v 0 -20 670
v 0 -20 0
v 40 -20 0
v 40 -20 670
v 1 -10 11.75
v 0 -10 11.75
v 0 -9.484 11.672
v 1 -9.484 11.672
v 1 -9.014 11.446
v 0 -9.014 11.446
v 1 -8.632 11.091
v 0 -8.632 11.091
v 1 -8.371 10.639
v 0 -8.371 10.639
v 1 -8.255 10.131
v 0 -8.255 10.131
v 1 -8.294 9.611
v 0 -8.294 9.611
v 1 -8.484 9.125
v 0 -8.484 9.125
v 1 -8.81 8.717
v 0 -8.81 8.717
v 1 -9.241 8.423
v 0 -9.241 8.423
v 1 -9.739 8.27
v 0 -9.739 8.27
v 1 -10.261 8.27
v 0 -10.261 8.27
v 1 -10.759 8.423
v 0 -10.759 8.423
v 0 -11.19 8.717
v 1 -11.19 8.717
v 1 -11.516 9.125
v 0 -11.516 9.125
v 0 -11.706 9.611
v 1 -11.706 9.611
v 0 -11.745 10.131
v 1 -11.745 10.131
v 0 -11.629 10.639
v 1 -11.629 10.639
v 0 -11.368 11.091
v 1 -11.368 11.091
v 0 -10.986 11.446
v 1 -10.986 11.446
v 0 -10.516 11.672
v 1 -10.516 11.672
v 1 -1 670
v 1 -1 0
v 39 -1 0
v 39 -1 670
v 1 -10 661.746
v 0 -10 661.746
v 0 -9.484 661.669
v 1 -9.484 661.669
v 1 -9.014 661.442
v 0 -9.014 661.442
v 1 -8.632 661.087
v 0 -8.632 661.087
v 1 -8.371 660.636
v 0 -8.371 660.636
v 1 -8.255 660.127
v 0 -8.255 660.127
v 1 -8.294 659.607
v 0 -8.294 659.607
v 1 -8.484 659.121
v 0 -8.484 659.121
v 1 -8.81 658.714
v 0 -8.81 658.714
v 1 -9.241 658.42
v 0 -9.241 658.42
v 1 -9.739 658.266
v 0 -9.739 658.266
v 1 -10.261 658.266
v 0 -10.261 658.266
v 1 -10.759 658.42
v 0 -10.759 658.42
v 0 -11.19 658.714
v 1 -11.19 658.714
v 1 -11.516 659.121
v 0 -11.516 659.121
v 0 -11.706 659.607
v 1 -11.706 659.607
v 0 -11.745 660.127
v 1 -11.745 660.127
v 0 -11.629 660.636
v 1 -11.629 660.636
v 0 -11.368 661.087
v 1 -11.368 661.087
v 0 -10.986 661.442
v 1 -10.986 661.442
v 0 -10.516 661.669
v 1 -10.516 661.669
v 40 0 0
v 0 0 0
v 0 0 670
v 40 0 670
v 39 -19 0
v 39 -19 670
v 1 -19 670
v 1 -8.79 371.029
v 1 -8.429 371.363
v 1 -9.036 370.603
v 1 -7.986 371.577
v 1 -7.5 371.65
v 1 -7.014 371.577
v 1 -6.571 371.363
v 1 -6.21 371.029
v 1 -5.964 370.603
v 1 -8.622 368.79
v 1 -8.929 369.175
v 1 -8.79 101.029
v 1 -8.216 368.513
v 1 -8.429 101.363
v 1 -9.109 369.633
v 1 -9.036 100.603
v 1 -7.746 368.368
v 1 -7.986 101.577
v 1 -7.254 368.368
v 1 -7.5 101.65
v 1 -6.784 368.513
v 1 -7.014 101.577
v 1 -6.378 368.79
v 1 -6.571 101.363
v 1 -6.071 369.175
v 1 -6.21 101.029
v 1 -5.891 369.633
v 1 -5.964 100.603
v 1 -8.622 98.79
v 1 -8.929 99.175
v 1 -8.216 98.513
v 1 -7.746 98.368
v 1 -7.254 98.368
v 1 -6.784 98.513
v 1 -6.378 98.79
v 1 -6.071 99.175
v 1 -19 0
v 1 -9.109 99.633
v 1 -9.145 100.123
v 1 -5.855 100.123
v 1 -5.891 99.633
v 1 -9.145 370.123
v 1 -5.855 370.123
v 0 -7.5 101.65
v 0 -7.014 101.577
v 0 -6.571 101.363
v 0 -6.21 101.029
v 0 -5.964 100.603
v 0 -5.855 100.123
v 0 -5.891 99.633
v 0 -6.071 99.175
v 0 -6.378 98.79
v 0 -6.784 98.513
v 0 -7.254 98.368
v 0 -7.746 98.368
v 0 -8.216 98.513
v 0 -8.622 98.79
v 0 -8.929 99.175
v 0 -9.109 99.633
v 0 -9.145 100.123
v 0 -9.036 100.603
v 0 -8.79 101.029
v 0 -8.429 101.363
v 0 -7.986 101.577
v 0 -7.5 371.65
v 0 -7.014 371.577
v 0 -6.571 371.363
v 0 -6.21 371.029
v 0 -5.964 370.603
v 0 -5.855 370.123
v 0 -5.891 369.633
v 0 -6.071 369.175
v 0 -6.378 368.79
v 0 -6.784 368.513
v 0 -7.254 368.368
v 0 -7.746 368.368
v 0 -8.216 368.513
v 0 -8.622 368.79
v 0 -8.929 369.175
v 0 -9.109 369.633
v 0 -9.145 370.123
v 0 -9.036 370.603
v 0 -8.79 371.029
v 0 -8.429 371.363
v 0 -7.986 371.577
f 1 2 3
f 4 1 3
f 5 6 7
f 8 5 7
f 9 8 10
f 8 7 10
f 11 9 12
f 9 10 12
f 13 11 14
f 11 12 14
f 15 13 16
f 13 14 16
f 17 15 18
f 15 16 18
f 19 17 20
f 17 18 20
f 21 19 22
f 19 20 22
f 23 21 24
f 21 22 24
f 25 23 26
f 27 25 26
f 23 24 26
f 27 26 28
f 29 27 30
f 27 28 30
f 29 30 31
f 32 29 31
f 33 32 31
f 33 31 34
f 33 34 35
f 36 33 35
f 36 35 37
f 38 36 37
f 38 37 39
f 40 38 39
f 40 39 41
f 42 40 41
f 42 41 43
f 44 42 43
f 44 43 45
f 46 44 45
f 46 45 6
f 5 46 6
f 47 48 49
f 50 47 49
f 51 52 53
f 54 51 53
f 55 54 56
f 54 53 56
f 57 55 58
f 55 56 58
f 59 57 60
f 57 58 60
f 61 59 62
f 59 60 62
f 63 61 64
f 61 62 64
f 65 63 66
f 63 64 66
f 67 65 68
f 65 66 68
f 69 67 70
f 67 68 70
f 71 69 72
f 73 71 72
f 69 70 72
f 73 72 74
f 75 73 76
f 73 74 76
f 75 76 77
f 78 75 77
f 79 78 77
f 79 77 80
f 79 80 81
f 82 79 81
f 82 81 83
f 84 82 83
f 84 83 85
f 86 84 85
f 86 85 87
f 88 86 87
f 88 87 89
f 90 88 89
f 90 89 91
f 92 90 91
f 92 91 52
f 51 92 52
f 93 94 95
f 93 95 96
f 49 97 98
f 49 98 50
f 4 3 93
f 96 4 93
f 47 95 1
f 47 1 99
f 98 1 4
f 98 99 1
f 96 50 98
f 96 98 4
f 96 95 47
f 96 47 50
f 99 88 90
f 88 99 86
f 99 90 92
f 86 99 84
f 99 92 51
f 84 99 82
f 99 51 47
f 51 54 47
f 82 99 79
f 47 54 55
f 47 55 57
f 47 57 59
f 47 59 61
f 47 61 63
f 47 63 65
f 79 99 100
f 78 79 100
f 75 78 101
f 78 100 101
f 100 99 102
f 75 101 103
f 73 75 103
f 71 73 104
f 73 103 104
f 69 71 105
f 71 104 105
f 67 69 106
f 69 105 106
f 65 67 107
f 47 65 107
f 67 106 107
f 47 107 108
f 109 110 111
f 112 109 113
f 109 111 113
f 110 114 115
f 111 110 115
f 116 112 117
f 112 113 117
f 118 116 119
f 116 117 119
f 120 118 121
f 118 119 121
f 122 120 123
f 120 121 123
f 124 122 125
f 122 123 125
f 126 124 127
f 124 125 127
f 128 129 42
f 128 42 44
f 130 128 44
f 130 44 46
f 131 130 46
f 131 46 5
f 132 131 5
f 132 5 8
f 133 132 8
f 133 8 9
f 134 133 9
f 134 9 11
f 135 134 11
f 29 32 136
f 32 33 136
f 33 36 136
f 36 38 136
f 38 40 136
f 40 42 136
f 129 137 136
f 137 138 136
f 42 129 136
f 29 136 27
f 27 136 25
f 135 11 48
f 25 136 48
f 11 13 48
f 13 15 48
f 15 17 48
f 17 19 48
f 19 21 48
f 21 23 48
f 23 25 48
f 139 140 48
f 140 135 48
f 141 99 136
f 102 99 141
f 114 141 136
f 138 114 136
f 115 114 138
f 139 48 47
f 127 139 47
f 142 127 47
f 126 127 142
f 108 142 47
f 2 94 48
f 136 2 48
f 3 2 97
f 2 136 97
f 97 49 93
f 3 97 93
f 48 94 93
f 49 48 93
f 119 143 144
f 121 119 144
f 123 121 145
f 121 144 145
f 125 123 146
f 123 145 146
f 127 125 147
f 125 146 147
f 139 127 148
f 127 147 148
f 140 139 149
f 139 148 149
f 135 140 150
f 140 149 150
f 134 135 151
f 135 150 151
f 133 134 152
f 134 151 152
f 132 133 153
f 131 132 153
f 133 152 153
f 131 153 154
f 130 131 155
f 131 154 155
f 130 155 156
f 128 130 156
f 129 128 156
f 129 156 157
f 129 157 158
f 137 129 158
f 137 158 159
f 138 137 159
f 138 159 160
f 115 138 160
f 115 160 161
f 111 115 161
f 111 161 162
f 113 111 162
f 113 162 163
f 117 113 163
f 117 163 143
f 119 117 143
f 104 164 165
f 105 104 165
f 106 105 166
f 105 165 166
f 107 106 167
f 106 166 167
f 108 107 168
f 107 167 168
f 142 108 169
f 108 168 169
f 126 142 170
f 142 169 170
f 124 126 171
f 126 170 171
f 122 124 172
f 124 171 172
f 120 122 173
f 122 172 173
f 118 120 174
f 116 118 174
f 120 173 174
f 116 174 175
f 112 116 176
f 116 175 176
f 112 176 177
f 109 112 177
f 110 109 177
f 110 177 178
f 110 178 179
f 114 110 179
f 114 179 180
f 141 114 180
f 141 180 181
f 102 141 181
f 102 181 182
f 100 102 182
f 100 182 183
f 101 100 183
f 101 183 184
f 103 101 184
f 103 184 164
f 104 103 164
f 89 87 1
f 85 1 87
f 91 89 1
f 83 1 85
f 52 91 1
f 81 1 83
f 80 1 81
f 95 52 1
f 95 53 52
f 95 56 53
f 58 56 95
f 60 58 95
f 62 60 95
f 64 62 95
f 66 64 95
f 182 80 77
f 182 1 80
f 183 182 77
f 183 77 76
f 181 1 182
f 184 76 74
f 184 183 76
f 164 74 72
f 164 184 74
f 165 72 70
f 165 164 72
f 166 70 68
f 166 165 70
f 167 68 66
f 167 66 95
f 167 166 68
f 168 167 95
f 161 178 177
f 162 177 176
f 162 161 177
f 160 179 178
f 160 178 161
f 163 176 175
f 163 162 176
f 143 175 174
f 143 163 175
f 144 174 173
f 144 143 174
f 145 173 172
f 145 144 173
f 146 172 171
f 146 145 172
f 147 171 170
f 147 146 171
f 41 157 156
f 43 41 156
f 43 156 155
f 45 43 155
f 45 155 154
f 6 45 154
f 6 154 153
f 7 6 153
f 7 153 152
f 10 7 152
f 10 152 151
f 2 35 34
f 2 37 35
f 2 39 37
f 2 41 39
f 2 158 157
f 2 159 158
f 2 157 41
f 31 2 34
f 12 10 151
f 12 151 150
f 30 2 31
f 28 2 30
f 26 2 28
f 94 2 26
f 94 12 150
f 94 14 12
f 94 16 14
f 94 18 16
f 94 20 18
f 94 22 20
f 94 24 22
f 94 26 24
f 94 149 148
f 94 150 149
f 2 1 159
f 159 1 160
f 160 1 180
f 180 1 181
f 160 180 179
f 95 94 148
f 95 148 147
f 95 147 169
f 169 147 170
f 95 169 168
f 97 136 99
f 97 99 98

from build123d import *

# Parameters (mm, degrees)
SKETCH_1_W          = 40
SKETCH_1_H          = 20
SKETCH_1_W_2        = 38
SKETCH_1_H_2        = 18
EXTRUDE_1_DEPTH     = 670
SKETCH_4_R          = 1.75
CUT_EXTRUDE_2_DEPTH = 1.5
SKETCH_8_R          = 1.65
CUT_EXTRUDE_3_DEPTH = 5


with BuildPart() as part:
    # 草图1 → 拉伸-薄壁1 (new body)
    with BuildSketch(Plane.XY):
        with Locations((20, -10)):
            Rectangle(SKETCH_1_W, SKETCH_1_H)
        with Locations((20, -10)):
            Rectangle(SKETCH_1_W_2, SKETCH_1_H_2, mode=Mode.SUBTRACT)
    extrude(amount=EXTRUDE_1_DEPTH)

    # 草图4 → 切除-拉伸2 (cut)
    with BuildSketch(Plane.ZY):
        with Locations((659.996387591, -10)):
            Circle(SKETCH_4_R)
        with Locations((10, -10.000000002)):
            Circle(SKETCH_4_R)
    extrude(amount=-CUT_EXTRUDE_2_DEPTH, mode=Mode.SUBTRACT)

    # 草图8 → 切除-拉伸3 (cut)
    with BuildSketch(Plane.ZY):
        with Locations((100, -7.5)):
            Circle(SKETCH_8_R)
        with Locations((370, -7.5)):
            Circle(SKETCH_8_R)
    extrude(amount=-CUT_EXTRUDE_3_DEPTH, mode=Mode.SUBTRACT)


solid = part.part
